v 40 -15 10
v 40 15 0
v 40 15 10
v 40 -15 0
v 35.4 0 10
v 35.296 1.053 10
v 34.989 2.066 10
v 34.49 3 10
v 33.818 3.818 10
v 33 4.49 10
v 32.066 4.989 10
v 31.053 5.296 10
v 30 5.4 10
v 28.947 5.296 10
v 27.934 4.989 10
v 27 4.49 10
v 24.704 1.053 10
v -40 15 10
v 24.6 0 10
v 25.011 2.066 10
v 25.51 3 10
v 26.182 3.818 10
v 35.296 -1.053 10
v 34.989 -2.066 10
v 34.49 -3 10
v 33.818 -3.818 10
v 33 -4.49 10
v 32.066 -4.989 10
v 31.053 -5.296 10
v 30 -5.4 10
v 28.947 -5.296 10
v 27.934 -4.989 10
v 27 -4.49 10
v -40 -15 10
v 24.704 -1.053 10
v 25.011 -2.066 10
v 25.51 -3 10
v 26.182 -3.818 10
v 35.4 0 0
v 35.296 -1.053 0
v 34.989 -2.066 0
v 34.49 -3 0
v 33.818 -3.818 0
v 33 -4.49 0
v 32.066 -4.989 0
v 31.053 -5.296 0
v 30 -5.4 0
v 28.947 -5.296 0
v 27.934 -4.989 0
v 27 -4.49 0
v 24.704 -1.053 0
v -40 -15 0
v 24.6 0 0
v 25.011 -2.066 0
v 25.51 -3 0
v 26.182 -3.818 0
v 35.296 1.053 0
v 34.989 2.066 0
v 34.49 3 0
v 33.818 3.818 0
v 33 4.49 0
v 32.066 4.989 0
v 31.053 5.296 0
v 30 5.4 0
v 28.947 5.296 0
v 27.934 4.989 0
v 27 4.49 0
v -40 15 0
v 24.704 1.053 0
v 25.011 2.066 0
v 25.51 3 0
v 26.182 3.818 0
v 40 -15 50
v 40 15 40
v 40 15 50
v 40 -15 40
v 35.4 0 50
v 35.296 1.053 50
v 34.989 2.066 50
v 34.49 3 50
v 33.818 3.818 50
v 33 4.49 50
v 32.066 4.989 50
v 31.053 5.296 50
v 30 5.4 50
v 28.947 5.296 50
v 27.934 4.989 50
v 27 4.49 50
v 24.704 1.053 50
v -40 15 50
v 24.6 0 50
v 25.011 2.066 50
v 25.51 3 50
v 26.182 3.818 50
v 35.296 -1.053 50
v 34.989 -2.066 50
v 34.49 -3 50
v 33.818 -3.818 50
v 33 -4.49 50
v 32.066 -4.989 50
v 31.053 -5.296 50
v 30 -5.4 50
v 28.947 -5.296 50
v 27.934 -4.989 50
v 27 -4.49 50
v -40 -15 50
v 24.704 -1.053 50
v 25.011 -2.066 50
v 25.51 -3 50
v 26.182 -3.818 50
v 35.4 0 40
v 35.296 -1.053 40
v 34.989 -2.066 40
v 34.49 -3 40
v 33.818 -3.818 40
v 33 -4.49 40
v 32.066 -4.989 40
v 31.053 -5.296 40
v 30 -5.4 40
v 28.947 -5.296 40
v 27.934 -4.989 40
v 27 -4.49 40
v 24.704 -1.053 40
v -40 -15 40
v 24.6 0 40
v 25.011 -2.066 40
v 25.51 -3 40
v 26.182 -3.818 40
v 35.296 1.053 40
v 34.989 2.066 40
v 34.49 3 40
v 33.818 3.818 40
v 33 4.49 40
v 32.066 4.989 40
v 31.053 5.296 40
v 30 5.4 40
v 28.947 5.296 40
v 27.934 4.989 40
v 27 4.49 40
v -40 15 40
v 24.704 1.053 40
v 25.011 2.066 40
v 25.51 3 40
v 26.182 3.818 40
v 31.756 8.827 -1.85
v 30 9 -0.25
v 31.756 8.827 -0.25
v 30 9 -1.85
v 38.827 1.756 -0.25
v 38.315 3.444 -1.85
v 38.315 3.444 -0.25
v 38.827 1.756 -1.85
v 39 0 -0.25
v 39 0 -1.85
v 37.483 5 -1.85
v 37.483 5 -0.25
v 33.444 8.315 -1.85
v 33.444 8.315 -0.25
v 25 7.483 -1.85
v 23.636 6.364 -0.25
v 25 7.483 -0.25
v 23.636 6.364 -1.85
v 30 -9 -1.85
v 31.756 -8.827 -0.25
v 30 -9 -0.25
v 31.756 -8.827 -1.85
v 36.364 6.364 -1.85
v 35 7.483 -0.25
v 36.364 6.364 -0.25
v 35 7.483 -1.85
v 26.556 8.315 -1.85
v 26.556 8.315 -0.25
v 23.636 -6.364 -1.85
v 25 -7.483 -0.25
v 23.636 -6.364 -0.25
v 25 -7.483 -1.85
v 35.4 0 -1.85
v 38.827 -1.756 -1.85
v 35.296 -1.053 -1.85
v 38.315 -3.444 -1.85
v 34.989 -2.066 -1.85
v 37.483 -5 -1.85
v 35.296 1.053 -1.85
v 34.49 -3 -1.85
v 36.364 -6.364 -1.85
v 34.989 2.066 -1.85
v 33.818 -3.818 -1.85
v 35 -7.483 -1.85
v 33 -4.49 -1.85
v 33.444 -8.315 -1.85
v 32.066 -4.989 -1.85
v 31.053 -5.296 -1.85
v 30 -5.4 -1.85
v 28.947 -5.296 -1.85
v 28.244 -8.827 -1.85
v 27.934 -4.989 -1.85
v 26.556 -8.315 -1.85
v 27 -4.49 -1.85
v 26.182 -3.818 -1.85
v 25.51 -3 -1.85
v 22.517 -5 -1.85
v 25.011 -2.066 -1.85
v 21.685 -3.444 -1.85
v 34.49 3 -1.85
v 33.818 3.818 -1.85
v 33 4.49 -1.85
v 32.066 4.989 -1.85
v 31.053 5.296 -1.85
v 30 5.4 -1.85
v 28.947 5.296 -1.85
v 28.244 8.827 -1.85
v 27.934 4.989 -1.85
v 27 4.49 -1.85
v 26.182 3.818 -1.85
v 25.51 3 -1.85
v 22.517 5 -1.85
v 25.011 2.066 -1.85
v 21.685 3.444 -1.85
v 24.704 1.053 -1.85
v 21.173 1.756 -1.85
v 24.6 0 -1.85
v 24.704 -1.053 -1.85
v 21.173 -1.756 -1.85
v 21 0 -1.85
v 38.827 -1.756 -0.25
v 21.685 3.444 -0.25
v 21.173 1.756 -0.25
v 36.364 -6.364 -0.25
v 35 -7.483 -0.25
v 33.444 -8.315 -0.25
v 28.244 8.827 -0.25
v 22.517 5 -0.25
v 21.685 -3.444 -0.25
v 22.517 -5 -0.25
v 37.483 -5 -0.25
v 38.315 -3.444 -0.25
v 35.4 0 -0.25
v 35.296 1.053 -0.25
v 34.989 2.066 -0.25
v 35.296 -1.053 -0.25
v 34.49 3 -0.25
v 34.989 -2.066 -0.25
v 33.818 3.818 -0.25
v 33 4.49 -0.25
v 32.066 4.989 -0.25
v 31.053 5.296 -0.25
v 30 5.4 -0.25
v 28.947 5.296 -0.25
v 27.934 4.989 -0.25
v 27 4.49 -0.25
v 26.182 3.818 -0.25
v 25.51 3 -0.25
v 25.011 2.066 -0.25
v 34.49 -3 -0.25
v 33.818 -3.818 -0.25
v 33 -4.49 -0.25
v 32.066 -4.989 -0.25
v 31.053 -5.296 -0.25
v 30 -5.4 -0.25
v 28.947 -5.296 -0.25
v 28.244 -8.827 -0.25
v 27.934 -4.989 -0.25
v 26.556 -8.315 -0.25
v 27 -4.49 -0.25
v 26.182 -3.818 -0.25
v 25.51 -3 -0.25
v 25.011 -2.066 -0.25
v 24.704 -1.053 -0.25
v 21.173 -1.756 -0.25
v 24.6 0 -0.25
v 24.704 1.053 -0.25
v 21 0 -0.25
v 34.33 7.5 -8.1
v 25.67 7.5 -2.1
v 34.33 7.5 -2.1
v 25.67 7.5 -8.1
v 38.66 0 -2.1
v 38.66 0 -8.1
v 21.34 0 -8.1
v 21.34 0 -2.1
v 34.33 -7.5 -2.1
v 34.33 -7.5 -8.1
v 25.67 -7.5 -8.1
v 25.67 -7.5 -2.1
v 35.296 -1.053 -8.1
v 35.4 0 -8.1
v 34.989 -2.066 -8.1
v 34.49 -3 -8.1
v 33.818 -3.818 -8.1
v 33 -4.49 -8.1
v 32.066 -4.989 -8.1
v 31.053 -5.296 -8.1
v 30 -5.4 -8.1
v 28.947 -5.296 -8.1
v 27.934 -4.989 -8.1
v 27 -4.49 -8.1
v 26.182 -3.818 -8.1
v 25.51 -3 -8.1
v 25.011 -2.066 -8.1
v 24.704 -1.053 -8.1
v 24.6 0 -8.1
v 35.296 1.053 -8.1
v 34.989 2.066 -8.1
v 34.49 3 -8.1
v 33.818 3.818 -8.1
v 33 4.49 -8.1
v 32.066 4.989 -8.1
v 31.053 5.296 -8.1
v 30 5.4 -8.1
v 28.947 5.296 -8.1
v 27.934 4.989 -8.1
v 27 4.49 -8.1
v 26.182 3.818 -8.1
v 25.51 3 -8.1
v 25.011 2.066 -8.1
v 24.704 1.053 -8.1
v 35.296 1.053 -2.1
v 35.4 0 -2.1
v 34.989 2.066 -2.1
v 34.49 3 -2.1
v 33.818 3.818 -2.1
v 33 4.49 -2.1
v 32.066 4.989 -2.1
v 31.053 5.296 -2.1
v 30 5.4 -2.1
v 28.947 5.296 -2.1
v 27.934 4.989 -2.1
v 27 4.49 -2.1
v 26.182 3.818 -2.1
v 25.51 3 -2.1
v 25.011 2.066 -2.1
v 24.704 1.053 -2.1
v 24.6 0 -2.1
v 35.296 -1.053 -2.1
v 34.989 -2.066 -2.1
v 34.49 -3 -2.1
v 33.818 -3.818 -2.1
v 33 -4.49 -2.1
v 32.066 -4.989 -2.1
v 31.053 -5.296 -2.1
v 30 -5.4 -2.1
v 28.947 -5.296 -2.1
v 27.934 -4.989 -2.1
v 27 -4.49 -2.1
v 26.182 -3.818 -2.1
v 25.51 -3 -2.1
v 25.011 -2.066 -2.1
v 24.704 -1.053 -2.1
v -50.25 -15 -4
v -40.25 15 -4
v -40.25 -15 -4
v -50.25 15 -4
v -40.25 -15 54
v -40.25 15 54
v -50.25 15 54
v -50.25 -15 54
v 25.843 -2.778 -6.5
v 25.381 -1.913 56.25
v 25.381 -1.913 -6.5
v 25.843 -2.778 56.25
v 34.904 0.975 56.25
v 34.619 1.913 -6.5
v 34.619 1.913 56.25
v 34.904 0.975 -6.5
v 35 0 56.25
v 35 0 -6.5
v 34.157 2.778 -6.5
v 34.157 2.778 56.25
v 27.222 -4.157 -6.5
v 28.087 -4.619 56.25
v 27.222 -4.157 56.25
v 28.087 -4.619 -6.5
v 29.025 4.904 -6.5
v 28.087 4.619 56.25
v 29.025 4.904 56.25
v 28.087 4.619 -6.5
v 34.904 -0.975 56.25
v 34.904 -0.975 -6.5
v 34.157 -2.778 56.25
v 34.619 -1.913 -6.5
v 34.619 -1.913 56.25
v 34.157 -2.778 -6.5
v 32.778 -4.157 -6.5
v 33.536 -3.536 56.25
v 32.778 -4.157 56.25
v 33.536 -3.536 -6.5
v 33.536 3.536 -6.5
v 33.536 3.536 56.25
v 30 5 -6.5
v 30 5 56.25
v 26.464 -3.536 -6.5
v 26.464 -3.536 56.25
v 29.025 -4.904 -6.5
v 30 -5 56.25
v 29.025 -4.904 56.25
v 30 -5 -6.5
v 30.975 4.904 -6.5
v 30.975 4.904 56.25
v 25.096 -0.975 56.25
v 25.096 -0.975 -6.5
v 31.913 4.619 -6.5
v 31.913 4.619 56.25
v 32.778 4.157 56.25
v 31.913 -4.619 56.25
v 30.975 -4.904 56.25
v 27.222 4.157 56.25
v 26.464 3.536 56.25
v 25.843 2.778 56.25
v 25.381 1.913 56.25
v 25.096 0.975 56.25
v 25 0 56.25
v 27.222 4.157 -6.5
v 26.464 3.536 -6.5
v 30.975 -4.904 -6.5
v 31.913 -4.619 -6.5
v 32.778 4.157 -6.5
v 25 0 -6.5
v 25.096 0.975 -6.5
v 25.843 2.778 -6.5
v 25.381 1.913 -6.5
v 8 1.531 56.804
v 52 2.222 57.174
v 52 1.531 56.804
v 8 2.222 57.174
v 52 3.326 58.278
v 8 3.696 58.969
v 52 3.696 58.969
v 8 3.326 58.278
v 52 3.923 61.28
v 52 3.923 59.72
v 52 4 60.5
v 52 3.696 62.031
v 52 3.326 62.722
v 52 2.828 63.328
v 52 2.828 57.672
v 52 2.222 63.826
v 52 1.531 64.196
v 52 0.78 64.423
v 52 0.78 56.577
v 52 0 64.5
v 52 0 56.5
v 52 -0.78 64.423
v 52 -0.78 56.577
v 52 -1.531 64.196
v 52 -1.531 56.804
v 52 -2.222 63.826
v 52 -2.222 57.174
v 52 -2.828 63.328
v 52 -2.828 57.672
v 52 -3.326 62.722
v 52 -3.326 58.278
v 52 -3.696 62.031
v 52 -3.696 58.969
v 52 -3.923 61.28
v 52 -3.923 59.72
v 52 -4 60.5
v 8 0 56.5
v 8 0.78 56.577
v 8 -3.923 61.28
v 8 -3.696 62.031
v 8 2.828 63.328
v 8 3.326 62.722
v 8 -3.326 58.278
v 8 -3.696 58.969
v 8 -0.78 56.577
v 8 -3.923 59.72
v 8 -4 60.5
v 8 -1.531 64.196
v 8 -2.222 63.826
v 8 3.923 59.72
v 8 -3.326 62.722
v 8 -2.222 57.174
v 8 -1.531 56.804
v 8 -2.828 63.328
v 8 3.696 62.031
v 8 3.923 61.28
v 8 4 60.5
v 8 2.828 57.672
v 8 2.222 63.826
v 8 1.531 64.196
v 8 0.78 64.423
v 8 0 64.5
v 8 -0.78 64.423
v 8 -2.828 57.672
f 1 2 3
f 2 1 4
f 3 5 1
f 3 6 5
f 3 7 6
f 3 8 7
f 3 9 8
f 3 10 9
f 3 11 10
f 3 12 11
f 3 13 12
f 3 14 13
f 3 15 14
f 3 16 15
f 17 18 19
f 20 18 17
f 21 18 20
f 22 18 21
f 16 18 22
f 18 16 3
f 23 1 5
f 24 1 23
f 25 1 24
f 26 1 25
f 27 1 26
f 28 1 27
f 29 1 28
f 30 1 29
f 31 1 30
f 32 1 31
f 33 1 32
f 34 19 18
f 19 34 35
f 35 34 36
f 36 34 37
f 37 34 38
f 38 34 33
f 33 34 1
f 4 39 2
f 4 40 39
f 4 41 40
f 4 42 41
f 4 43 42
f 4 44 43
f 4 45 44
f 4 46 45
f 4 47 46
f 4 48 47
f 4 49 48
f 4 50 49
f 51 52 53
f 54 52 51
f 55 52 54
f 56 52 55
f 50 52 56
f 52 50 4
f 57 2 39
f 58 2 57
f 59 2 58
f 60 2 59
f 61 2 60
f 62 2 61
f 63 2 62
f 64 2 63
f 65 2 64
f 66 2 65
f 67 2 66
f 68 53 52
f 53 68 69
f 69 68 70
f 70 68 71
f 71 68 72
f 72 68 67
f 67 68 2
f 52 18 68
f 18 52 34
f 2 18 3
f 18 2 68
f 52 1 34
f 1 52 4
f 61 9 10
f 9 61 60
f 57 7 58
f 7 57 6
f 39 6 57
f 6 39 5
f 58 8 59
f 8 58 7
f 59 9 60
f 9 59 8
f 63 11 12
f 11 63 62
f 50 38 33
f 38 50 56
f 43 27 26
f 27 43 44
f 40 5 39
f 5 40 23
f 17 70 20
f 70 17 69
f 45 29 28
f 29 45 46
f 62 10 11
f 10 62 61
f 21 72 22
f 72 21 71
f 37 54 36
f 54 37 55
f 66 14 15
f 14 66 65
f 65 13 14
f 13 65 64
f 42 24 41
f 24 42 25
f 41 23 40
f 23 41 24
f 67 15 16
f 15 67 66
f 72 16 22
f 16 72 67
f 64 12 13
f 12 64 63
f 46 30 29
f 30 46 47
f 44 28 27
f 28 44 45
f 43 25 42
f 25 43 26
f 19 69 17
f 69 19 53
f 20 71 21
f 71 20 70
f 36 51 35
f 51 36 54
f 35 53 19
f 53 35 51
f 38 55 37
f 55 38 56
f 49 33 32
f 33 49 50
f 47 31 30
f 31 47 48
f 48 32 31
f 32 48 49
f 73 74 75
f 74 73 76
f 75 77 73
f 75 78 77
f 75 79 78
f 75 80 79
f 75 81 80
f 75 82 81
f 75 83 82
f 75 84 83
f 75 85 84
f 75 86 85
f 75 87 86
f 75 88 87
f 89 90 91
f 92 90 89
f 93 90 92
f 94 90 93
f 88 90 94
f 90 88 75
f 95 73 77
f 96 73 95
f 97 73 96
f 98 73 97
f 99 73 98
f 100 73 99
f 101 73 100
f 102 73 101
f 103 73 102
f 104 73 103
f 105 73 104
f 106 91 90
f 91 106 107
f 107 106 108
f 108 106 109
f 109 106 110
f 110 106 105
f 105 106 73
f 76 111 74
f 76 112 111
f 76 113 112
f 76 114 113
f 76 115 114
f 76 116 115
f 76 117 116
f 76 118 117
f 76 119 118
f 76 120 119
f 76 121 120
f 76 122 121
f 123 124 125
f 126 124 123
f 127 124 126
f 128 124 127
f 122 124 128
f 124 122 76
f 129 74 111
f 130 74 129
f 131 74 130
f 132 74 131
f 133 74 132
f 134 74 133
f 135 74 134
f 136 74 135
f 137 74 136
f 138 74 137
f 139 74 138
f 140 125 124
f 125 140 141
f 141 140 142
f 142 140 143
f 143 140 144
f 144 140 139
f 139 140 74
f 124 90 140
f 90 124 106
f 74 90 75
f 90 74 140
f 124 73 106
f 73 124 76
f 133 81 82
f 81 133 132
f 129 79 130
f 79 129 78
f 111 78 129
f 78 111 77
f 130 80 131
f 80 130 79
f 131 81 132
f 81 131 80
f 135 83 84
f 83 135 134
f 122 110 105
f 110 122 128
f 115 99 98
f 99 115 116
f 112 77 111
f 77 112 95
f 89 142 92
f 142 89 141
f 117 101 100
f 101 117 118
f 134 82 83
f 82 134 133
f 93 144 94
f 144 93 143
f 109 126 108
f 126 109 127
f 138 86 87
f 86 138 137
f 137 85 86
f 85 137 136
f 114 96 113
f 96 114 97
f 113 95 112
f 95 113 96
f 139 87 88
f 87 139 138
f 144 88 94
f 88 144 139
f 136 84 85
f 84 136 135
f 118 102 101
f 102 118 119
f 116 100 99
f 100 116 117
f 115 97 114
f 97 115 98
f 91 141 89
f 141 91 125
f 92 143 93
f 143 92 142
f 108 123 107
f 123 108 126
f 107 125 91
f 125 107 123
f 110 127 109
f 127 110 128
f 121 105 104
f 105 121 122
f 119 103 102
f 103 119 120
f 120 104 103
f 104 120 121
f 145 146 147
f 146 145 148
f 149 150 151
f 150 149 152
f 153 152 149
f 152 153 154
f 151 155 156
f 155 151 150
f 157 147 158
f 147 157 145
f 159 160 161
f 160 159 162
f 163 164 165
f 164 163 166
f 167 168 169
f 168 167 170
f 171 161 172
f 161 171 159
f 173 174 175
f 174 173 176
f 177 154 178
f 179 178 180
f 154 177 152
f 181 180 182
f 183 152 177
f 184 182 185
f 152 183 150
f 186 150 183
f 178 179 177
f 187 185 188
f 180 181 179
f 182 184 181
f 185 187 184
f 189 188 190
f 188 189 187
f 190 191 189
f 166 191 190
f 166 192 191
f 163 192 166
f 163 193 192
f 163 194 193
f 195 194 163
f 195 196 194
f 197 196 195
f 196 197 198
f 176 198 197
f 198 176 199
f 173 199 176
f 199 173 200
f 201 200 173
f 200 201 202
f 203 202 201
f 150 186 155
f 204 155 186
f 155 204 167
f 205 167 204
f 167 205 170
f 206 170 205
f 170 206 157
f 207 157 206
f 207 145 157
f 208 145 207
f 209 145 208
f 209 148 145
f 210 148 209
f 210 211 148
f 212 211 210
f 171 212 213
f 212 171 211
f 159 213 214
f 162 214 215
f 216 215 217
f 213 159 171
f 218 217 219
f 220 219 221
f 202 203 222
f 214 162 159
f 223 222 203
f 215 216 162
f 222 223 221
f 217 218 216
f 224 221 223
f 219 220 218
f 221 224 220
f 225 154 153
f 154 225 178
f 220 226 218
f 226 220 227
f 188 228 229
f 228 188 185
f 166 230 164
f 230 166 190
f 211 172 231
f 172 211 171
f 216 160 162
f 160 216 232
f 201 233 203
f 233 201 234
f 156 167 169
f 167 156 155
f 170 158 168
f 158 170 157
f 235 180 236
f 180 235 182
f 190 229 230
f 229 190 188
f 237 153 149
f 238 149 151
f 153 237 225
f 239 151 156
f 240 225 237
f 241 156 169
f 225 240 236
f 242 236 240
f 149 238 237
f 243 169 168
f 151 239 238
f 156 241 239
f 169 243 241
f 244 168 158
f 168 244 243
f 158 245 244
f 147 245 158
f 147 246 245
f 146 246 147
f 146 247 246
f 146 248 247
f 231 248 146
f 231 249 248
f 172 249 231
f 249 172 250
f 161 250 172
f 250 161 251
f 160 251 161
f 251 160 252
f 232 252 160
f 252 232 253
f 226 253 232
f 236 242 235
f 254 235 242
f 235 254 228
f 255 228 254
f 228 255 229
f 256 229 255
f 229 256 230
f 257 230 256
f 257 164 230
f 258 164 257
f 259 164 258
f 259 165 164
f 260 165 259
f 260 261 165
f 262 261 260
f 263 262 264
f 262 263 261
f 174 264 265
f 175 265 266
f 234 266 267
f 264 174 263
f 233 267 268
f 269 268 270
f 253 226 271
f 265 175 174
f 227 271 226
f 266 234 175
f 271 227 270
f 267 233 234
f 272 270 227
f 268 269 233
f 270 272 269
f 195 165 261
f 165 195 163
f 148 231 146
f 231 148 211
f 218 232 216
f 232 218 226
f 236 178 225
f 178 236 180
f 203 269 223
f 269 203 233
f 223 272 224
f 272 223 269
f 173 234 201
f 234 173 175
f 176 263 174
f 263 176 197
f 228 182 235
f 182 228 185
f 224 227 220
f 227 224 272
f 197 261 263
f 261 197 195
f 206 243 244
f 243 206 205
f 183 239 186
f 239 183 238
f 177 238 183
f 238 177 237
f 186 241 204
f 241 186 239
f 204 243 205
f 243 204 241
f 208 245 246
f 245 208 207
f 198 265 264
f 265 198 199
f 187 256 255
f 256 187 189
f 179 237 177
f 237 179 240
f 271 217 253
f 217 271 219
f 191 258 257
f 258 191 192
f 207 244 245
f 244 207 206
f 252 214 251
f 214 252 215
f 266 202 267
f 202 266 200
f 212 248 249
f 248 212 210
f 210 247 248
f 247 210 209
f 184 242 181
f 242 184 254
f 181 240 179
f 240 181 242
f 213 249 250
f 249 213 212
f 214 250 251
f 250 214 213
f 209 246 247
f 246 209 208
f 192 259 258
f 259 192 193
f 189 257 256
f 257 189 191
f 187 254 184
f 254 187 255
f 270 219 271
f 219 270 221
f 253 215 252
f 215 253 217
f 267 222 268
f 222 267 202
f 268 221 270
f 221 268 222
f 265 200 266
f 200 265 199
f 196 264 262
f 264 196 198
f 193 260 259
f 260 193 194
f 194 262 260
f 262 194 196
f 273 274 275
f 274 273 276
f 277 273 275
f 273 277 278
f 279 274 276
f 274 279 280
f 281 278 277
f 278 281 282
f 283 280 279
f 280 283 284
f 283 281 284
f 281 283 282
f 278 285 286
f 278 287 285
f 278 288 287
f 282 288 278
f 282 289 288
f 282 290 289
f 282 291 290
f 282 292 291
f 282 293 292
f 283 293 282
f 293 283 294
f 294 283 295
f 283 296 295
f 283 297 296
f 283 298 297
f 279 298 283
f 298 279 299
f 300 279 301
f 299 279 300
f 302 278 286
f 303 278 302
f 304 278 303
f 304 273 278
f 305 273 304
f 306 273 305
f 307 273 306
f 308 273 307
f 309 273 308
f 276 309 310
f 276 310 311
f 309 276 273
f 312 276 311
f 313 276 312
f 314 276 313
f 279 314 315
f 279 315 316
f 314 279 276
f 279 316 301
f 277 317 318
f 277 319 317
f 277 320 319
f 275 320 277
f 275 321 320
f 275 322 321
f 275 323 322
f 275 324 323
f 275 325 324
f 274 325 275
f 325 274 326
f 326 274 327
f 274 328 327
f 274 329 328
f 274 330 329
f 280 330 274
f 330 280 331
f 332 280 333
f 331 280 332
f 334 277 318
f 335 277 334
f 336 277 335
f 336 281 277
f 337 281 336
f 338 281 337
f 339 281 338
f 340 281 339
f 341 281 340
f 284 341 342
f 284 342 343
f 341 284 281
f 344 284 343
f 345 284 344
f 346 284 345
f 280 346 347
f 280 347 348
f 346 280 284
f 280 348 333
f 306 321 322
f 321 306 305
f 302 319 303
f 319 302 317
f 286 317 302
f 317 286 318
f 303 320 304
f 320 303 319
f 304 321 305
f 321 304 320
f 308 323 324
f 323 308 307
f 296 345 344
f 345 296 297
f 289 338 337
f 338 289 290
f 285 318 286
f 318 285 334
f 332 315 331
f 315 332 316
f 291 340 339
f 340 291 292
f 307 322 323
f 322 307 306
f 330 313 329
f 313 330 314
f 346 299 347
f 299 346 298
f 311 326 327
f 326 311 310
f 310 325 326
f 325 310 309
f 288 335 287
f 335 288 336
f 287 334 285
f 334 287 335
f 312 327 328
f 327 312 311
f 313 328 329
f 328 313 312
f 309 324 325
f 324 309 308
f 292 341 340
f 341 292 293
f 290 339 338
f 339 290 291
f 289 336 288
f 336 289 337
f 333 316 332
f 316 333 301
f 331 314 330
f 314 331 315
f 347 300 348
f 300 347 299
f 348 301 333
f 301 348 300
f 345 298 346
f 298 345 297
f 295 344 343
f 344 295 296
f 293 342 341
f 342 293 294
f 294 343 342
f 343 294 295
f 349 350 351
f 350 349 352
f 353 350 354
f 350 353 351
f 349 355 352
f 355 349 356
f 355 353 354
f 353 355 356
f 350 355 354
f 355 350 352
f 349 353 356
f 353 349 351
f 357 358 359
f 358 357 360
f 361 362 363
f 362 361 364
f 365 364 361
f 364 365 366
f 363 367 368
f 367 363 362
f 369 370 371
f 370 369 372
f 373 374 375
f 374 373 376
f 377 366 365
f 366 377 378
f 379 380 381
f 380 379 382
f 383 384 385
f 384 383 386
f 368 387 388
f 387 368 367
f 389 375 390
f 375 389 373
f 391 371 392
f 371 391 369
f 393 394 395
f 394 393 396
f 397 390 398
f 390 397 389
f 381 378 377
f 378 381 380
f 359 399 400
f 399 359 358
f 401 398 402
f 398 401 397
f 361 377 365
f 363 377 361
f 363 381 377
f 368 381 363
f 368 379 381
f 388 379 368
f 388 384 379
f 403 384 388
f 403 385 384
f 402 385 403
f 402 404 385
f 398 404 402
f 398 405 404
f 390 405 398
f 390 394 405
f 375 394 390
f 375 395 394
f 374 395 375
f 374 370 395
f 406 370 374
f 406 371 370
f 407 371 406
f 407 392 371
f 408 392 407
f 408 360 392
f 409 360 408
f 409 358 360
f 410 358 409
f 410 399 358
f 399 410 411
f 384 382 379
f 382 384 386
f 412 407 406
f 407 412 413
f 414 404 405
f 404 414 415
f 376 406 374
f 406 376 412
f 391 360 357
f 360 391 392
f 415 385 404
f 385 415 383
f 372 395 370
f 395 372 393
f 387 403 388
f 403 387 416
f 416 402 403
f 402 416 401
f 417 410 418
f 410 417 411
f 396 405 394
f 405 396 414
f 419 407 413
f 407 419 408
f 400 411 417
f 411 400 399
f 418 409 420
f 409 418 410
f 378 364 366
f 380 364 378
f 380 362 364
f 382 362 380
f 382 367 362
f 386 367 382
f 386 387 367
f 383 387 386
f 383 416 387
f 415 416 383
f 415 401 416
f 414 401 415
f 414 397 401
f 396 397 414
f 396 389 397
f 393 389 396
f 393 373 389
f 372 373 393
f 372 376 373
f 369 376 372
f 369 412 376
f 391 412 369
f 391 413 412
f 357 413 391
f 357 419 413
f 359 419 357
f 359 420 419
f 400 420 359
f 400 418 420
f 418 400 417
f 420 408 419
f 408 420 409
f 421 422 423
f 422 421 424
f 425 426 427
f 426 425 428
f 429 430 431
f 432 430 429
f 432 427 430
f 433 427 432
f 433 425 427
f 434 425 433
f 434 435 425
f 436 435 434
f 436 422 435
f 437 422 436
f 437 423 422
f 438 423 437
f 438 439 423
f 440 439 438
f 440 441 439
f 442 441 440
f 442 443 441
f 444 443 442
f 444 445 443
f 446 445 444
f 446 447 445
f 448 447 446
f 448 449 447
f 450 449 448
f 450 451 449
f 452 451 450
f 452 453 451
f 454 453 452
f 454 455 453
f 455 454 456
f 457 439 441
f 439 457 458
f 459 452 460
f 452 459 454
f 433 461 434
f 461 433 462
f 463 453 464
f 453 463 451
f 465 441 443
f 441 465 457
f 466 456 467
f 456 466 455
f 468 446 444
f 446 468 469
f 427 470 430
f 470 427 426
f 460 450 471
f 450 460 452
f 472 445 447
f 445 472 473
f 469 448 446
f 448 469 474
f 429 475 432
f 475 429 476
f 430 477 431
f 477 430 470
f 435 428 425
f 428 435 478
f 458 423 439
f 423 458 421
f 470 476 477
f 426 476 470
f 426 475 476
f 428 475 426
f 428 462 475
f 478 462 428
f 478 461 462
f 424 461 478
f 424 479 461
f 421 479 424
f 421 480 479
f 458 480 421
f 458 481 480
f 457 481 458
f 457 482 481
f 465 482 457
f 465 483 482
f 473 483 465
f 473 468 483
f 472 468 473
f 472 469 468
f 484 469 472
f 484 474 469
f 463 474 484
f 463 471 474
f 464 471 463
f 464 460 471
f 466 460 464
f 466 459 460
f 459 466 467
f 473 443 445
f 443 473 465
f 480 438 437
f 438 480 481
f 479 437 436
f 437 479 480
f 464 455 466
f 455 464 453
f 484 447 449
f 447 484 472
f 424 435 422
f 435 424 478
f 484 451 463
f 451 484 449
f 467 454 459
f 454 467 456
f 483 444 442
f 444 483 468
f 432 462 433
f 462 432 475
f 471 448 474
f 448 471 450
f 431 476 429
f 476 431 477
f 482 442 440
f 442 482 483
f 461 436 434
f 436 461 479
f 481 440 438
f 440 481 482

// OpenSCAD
$fn = 32;

// ------------------------------------------------------------------------
// C clamp: throat 40 mm, screw d10
// Every part is its own module, assembly() places every instance.
// ------------------------------------------------------------------------

// --- part 1 ---
module clamp_arm() {
  difference() {
    translate([-40, -15, 0]) cube([80, 30, 10]);
    translate([30, 0, -1]) cylinder(h = 12, d = 10.8);
  }
}

// --- part 2 ---
module clamp_spine() {
  difference() {
    translate([-29, -15, 0]) cube([58, 30, 10]);
  }
}

// --- part 3 ---
module clamp_screw() {
  translate([0, 0, -31.375]) cylinder(h = 62.75, d = 10);
}

// --- part 4 ---
module clamp_washer() {
  difference() {
      translate([0, 0, 0]) cylinder(h = 1.6, d = 18);
      translate([0, 0, -1]) cylinder(h = 3.6, d = 10.8);
    }
}

// --- part 5 ---
module clamp_nut() {
  difference() {
    linear_extrude(height = 6) polygon(points = [[8.66, 0], [4.33, 7.5], [-4.33, 7.5], [-8.66, 0], [-4.33, -7.5], [4.33, -7.5]]);
    translate([0, 0, -1]) cylinder(h = 8, d = 10.8);
  }
}

// --- part 6 ---
module tommy_bar() {
  translate([0, 0, -22]) cylinder(h = 44, d = 8);
}

// --- assembly ---
module assembly() {
  color([0.80, 0.24, 0.20]) translate([0, 0, 0]) rotate([0, 0, 0]) clamp_arm();
  color([0.20, 0.45, 0.75]) translate([0, 0, 40]) rotate([0, 0, 0]) clamp_arm();
  color([0.25, 0.62, 0.32]) translate([-50.25, 0, 25]) rotate([0, 90, 0]) clamp_spine();
  color([0.92, 0.70, 0.18]) translate([30, 0, 24.875]) rotate([0, 0, 0]) clamp_screw();
  color([0.58, 0.35, 0.70]) translate([30, 0, -1.85]) rotate([0, 0, 0]) clamp_washer();
  color([0.16, 0.66, 0.66]) translate([30, 0, -8.1]) rotate([0, 0, 0]) clamp_nut();
  color([0.85, 0.48, 0.18]) translate([30, 0, 60.5]) rotate([0, 90, 0]) tommy_bar();
}

assembly();
